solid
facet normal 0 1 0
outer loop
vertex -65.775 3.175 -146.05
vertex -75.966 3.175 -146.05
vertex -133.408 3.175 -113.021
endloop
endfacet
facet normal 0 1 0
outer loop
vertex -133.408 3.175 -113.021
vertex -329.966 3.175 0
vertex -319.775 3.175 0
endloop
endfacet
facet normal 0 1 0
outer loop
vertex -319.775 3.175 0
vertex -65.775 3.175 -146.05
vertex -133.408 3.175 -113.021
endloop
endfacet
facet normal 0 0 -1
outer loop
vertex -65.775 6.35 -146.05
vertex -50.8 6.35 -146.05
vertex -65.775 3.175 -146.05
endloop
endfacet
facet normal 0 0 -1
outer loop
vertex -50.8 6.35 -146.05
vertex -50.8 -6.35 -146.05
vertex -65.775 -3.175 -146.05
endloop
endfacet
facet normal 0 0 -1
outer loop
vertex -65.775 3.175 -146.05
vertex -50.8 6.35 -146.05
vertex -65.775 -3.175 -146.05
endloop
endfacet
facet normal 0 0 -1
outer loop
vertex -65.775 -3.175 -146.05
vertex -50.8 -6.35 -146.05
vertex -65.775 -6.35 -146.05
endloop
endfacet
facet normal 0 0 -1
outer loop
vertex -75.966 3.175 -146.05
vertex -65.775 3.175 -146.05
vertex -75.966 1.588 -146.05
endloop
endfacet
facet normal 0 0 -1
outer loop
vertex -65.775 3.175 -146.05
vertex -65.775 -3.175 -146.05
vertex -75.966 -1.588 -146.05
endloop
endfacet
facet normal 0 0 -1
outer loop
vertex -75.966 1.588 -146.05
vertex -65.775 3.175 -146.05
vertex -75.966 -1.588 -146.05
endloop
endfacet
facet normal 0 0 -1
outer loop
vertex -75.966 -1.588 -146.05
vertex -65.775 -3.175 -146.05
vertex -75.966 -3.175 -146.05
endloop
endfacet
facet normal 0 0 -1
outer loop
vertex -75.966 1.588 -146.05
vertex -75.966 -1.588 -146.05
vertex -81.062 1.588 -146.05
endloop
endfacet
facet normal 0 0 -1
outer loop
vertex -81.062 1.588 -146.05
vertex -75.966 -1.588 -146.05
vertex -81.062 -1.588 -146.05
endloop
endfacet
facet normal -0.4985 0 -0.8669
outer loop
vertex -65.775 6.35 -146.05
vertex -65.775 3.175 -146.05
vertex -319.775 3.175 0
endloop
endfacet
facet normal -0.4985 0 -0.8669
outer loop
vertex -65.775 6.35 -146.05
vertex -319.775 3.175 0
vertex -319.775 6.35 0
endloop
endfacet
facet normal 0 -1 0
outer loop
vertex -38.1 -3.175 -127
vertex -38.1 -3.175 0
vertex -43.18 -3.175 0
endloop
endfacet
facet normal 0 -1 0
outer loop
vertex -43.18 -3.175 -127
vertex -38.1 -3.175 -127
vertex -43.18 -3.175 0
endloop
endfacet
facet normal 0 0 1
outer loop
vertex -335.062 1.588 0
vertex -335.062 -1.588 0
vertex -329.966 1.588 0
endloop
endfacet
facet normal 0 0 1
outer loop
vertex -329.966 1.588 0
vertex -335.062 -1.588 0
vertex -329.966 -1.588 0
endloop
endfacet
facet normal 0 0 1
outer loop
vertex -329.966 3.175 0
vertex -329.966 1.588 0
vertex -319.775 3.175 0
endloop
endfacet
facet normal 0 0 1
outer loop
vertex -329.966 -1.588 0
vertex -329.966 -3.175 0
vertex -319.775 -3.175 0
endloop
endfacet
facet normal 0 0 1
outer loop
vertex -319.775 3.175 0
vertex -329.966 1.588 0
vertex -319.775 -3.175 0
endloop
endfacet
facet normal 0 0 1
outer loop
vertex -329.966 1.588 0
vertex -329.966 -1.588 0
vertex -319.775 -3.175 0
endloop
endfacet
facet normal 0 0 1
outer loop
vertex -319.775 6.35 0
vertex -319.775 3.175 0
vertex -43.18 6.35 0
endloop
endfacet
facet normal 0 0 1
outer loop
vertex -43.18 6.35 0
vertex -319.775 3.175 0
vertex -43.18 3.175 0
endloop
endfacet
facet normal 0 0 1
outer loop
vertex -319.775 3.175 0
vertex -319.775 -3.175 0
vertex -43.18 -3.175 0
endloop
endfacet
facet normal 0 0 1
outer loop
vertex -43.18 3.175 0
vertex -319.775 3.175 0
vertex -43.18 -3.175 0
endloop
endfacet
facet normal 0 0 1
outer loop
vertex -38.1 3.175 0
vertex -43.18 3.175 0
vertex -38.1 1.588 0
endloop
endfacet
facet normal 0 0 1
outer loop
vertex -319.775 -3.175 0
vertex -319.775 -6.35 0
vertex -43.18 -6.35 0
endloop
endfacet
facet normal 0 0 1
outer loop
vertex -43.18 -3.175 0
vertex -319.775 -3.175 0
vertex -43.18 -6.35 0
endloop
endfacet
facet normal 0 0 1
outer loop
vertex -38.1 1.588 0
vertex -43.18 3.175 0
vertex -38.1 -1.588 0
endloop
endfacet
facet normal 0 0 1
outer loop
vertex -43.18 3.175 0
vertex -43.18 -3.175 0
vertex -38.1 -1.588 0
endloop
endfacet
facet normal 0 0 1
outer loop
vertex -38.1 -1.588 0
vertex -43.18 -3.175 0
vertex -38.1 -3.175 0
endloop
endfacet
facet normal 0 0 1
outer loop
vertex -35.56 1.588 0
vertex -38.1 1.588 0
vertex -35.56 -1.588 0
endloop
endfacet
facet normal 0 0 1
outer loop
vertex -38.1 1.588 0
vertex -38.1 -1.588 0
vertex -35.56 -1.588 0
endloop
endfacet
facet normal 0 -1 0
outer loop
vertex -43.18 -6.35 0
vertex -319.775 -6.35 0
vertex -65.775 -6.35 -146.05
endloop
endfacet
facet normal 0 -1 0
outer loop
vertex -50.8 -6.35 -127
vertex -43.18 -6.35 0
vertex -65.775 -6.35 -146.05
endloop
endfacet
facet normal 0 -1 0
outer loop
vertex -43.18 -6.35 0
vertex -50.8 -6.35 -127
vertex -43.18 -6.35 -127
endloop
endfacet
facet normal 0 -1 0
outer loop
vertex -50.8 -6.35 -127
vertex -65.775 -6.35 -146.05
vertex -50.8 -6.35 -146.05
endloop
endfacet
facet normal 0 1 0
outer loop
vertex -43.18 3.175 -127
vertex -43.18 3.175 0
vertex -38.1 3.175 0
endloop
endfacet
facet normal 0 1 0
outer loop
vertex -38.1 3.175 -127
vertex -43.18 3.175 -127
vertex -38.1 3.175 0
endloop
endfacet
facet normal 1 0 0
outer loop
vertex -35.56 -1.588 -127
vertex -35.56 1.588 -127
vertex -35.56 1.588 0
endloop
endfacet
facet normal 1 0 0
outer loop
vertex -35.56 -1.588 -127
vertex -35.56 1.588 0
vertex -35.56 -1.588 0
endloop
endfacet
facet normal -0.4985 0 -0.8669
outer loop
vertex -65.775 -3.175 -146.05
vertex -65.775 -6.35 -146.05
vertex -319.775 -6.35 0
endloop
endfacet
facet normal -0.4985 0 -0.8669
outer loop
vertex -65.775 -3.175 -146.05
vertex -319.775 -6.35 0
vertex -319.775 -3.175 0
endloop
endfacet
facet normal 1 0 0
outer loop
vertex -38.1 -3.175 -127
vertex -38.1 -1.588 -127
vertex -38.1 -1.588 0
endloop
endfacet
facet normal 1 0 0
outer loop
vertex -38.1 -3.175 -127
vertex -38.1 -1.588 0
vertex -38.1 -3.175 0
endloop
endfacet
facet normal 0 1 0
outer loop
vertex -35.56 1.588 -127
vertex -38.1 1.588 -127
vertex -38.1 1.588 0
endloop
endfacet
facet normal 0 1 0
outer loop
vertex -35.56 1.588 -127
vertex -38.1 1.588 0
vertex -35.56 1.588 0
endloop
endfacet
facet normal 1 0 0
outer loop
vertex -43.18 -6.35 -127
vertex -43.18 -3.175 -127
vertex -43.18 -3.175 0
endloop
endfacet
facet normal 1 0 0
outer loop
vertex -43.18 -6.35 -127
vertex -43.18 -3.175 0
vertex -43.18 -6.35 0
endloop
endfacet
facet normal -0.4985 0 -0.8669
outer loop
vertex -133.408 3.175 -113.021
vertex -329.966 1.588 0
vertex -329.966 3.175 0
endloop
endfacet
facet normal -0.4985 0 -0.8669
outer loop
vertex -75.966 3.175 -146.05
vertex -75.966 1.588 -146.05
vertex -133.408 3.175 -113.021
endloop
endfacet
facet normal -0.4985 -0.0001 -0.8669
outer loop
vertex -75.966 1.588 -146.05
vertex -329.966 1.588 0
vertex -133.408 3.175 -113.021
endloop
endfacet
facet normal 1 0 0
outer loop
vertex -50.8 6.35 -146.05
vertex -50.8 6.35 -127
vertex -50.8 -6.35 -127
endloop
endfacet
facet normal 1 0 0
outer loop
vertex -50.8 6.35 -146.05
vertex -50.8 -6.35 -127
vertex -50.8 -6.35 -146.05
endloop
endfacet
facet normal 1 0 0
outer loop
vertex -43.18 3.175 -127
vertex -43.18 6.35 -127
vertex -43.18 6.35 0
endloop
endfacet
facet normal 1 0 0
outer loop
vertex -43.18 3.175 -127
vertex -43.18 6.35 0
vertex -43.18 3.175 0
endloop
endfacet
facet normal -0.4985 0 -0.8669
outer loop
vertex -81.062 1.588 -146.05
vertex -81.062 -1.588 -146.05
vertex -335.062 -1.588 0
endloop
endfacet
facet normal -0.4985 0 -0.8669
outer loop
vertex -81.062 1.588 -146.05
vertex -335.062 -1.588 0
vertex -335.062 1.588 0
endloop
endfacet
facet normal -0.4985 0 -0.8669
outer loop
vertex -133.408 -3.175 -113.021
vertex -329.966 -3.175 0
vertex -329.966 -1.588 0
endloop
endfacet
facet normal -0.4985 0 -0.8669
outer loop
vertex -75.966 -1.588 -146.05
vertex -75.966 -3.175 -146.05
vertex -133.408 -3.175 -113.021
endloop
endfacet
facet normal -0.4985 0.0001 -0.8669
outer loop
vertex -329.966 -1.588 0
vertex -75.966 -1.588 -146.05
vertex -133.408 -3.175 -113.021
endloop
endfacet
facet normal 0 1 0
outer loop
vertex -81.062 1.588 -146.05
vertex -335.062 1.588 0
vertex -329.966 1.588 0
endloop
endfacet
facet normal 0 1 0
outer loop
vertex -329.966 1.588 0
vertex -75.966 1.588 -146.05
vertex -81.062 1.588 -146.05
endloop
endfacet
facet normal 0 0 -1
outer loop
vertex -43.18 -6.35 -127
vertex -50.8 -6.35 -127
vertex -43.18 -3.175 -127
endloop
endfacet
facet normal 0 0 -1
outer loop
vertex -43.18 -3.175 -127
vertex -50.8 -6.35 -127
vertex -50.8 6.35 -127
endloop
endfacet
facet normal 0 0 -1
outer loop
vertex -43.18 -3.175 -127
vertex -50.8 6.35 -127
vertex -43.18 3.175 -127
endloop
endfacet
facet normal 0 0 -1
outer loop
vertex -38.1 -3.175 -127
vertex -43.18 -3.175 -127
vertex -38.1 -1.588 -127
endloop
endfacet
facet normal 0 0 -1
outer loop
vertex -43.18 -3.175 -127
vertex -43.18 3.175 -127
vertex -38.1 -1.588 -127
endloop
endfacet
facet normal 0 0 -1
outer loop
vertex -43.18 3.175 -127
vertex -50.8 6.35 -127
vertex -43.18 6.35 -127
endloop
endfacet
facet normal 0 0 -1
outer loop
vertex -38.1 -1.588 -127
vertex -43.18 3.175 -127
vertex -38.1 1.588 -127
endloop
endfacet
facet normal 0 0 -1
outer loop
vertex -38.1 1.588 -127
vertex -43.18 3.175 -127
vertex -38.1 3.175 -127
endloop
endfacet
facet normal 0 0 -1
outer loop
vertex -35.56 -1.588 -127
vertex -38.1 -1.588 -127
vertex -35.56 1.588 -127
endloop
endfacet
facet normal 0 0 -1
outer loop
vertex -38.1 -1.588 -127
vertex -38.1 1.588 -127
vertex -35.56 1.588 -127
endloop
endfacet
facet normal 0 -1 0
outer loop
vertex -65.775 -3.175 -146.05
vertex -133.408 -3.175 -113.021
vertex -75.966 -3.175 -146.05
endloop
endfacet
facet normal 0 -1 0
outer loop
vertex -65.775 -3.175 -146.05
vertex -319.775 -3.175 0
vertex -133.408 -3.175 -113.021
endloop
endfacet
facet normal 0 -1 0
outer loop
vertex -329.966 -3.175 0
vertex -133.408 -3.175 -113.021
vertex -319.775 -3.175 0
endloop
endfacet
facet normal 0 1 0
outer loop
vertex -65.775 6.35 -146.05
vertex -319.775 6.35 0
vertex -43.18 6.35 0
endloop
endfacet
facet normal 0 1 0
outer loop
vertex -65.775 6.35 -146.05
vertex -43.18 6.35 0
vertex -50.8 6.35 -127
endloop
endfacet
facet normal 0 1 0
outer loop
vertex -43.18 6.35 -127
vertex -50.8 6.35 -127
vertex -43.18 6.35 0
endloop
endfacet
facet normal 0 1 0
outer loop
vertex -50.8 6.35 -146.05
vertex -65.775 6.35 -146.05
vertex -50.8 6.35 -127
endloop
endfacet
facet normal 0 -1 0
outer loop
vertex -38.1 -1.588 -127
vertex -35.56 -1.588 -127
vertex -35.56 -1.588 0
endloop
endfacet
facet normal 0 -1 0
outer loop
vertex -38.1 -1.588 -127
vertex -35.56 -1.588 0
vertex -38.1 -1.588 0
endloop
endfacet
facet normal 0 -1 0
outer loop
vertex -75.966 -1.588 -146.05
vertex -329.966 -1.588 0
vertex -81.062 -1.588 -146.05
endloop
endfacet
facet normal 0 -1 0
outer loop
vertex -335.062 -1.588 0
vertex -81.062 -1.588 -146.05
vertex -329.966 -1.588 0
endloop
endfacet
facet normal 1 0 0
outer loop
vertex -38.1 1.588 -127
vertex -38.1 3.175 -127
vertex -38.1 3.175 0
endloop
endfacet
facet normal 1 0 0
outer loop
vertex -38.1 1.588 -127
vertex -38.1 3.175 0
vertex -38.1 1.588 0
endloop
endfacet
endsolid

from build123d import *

# Parameters (mm, degrees)
BOSS_EXTRUDE1_DEPTH      = 6.35
BOSS_EXTRUDE1_DEPTH_BACK = 6.35
SKETCH2_W                = 292.995908675
SKETCH2_H                = 3.175
CUT_EXTRUDE1_DEPTH       = 38.1
SKETCH3_W                = 146.05
SKETCH3_H                = 3.175
CUT_EXTRUDE2_DEPTH       = 38.1
CUT_EXTRUDE3_DEPTH       = 3.175
CUT_EXTRUDE4_DEPTH       = 3.175
SKETCH6_W                = 5.08
SKETCH6_H                = 3.175
CUT_EXTRUDE5_DEPTH       = 157.099
CUT_EXTRUDE6_DEPTH       = 339.217
CUT_EXTRUDE6_DEPTH_BACK  = 157.099
SKETCH9_W                = 50.8
SKETCH9_H                = 19.05
CUT_EXTRUDE7_DEPTH       = 21.59


with BuildPart() as part:
    # Sketch1 → Boss-Extrude1 (new, two sides: drawn at the far end of the back side and taken through both)
    with BuildSketch(Plane(origin=(0, 0, 0), x_dir=(1, 0, 0), z_dir=(0, 1, 0)).offset(-BOSS_EXTRUDE1_DEPTH_BACK)):
        Polygon((-406.4, 0), (0, 0), (0, 146.05), (-152.4, 146.05), align=None)
    extrude(amount=BOSS_EXTRUDE1_DEPTH + BOSS_EXTRUDE1_DEPTH_BACK)

    # Sketch2 → Cut-Extrude1 (cut)
    with BuildSketch(Plane(origin=(-100.979614843, 0, -175.616721465), x_dir=(-0.8669063030575352, 0, 0.49847112425808277), z_dir=(-0.4984711242580827, 0, -0.8669063030575351))):
        with Locations((205.812767226, 4.7625)):
            Rectangle(SKETCH2_W, SKETCH2_H)
        with Locations((205.812767226, -4.7625)):
            Rectangle(SKETCH2_W, SKETCH2_H)
    extrude(amount=-CUT_EXTRUDE1_DEPTH, mode=Mode.SUBTRACT)

    # Sketch3 → Cut-Extrude2 (cut)
    with BuildSketch(Plane(origin=(0, 0, 0), x_dir=(0, 0, -1), z_dir=(1, 0, 0))):
        with Locations((73.025, 4.7625)):
            Rectangle(SKETCH3_W, SKETCH3_H)
        with Locations((73.025, -4.7625)):
            Rectangle(SKETCH3_W, SKETCH3_H)
    extrude(amount=-CUT_EXTRUDE2_DEPTH, mode=Mode.SUBTRACT)

    # Sketch4 → Cut-Extrude3 (cut)
    with BuildSketch(Plane(origin=(0, 6.35, 0), x_dir=(1, 0, 0), z_dir=(0, 1, 0))):
        Polygon((-133.408250166, 113.020869854), (-75.966284694, 146.05), (-152.4, 146.05), align=None)
    extrude(amount=-CUT_EXTRUDE3_DEPTH, mode=Mode.SUBTRACT)

    # Sketch5 → Cut-Extrude4 (cut)
    with BuildSketch(Plane.XZ.offset(6.35)):
        Polygon((-133.408250166, -113.020869854), (-75.966284694, -146.05), (-152.4, -146.05), align=None)
    extrude(amount=-CUT_EXTRUDE4_DEPTH, mode=Mode.SUBTRACT)

    # Sketch6 → Cut-Extrude5 (cut)
    with BuildSketch(Plane(origin=(0, 0, -146.05), x_dir=(-1, 0, 0), z_dir=(0, 0, -1))):
        Polygon((0, -3.175), (38.1, -3.175), (38.1, -1.5875), (35.56, -1.5875), (35.56, 1.5875), (38.1, 1.5875), (38.1, 3.175), (0, 3.175), align=None)
        with Locations((40.64, -4.7625)):
            Rectangle(SKETCH6_W, SKETCH6_H)
        with Locations((40.64, 4.7625)):
            Rectangle(SKETCH6_W, SKETCH6_H)
    extrude(amount=-CUT_EXTRUDE5_DEPTH, mode=Mode.SUBTRACT)

    # Sketch8 → Cut-Extrude6 (cut, two sides: drawn at the far end of the back side and taken through both)
    with BuildSketch(Plane(origin=(-51.420385157, 0, 29.566721465), x_dir=(0.49847112425808243, 0, 0.8669063030575355), z_dir=(-0.8669063030575355, 0, 0.49847112425808243)).offset(-CUT_EXTRUDE6_DEPTH_BACK)):
        Polygon((-164.478664898, 1.5875), (-164.478664898, 3.175), (-159.398664898, 3.175), (-159.398664898, 6.35), (-164.478664898, 6.35), (-202.578664898, 6.35), (-202.578664898, -6.35), (-164.478664898, -6.35), (-159.398664898, -6.35), (-159.398664898, -3.175), (-164.478664898, -3.175), (-164.478664898, -1.5875), (-167.018664898, -1.5875), (-167.018664898, 1.5875), align=None)
    extrude(amount=CUT_EXTRUDE6_DEPTH + CUT_EXTRUDE6_DEPTH_BACK, mode=Mode.SUBTRACT)

    # Sketch9 → Cut-Extrude7 (cut)
    with BuildSketch(Plane(origin=(0, 6.35, 0), x_dir=(1, 0, 0), z_dir=(0, 1, 0))):
        with Locations((-25.4, 136.525)):
            Rectangle(SKETCH9_W, SKETCH9_H)
    extrude(amount=-CUT_EXTRUDE7_DEPTH, mode=Mode.SUBTRACT)


solid = part.part
